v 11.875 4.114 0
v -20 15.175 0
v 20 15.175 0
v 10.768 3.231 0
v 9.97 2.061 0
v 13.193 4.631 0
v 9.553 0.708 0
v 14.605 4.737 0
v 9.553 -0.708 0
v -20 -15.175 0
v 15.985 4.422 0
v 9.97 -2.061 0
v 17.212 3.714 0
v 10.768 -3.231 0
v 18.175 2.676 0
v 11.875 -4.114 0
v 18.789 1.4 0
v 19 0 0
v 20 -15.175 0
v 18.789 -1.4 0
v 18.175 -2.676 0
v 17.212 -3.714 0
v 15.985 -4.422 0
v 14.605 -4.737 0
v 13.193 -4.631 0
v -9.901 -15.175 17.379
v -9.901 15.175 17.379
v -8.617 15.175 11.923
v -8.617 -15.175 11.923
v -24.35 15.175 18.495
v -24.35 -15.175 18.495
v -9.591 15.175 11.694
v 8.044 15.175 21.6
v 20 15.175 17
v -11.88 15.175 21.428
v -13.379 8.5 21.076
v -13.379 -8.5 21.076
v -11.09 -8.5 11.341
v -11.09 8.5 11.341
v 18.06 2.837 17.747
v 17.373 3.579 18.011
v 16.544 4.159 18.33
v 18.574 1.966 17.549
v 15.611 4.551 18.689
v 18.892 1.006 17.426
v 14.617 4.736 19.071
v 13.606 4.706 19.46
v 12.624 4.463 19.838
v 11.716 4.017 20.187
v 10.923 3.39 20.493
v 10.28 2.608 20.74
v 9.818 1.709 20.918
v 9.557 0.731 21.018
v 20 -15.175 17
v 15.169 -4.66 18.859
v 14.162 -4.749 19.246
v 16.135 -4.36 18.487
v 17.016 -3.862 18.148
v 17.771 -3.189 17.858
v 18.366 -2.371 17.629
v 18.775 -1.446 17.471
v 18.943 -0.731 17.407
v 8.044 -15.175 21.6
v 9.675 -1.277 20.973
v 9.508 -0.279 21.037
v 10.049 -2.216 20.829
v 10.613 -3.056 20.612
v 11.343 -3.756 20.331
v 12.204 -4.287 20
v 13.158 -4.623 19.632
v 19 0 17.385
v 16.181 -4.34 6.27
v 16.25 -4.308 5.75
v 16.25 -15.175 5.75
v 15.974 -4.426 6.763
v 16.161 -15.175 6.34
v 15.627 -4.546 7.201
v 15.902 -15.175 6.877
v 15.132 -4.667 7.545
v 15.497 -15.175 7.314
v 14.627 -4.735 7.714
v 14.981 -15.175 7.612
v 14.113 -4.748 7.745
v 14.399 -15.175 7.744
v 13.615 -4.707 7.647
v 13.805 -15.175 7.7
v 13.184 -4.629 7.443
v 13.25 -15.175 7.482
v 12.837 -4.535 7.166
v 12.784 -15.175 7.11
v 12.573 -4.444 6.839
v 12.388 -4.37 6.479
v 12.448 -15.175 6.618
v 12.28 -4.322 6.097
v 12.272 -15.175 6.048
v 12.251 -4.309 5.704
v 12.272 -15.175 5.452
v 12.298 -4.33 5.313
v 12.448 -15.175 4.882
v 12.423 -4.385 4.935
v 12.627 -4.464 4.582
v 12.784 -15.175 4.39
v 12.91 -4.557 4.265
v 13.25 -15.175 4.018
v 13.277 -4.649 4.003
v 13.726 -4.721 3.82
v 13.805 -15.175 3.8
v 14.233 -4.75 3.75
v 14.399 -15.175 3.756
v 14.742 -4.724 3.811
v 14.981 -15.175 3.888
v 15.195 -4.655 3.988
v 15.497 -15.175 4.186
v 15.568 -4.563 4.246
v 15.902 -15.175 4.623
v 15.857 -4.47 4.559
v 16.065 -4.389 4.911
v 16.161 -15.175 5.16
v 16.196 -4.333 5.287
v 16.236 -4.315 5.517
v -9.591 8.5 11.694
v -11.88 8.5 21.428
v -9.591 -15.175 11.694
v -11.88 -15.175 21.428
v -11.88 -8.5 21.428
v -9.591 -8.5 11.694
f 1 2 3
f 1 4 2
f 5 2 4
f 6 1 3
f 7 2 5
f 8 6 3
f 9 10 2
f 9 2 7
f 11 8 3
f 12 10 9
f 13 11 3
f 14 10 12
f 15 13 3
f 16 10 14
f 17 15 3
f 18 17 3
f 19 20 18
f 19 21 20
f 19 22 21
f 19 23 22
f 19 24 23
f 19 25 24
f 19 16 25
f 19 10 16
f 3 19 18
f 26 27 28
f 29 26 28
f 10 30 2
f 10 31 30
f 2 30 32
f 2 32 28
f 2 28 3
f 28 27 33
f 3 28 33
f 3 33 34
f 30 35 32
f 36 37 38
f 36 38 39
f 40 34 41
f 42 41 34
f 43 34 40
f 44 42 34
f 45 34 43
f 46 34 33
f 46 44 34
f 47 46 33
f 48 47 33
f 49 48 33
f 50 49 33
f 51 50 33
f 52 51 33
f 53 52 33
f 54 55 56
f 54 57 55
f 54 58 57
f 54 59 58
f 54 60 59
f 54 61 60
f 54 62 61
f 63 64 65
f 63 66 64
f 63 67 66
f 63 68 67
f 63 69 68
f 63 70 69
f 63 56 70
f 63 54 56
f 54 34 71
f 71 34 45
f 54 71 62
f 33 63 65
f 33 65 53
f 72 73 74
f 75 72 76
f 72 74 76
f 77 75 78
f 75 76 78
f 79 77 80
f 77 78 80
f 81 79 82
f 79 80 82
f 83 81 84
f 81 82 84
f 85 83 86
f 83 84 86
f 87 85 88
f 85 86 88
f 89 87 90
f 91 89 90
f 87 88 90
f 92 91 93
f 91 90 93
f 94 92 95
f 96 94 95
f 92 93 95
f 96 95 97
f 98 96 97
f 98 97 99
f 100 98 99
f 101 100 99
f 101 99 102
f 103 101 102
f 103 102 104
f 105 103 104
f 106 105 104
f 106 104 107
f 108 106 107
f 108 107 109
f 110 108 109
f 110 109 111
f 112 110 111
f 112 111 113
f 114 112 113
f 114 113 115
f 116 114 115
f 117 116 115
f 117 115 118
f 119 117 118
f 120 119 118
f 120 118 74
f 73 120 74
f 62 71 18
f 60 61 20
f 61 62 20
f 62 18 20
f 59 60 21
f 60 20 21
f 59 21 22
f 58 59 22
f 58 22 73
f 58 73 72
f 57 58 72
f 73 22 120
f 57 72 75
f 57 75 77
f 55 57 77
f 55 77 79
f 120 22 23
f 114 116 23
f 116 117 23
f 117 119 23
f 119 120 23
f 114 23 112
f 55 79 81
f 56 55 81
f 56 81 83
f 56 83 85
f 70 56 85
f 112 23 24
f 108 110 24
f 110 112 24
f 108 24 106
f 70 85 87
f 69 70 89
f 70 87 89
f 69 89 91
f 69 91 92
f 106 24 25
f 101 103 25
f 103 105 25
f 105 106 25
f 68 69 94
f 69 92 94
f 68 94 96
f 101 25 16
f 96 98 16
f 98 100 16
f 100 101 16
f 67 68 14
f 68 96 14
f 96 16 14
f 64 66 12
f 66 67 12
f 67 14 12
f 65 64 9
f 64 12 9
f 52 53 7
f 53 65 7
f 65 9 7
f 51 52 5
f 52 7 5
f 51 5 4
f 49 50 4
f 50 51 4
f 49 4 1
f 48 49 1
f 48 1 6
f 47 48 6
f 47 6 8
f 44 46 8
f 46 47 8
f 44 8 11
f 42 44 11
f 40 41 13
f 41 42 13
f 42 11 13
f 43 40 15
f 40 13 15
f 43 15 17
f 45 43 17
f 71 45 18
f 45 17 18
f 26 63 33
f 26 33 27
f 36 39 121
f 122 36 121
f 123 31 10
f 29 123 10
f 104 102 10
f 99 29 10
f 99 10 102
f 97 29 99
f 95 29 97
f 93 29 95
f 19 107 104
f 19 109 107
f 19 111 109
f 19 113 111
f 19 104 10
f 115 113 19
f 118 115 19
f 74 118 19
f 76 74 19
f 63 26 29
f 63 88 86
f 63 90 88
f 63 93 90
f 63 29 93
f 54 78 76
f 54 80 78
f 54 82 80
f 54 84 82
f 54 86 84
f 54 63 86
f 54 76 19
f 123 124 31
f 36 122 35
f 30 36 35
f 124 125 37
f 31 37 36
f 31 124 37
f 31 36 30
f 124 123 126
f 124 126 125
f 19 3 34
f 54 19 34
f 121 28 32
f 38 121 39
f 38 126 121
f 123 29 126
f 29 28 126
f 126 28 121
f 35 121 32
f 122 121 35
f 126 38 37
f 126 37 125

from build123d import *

# Parameters (mm, degrees)
F1_DEPTH = 15.175
F2_R     = 4.75
F3_DEPTH = 21.601
F4_W     = 1.54
F4_H     = 17
F5_DEPTH = 10
F6_R     = 2
F7_DEPTH = 10.8675781151


with BuildPart() as f1:
    # F0 (on Front) → F1 (new body, symmetric)
    with BuildSketch(Plane.XZ):
        Polygon((-20, 0), (20, 0), (20, 17), (8.0444113487, 21.6), (-9.9007201474, 17.3794053198), (-8.6173364513, 11.9227123817), (-9.5907752539, 11.6937650133), (-11.8802489381, 21.4281530397), (-24.35, 18.4953372502), align=None)
    extrude(amount=F1_DEPTH, both=True)

    # F2 (on face) → F3 (cut, through all)
    with BuildSketch(Plane(origin=(0, 0, 0), x_dir=(1, 0, 0), z_dir=(0, 0, -1))):
        with Locations((14.25, 0)):
            Circle(F2_R)
    extrude(amount=-F3_DEPTH, mode=Mode.SUBTRACT)

    # F4 (on face) → F5 (cut)
    with BuildSketch(Plane(origin=(-5.3983379501, 0, 22.9526622939), x_dir=(0.9734388026, 0, 0.2289473684), z_dir=(-0.2289473684, 0, 0.9734388026))):
        with Locations((-7.4287760529, 0)):
            Rectangle(F4_W, F4_H)
    extrude(amount=-F5_DEPTH, mode=Mode.SUBTRACT)

    # F6 (on face) → F7 (cut, through all)
    with BuildSketch(Plane.XZ.offset(15.175)):
        with Locations((14.25, 5.75)):
            Circle(F6_R)
    extrude(amount=-F7_DEPTH, mode=Mode.SUBTRACT)


solid = f1.part
